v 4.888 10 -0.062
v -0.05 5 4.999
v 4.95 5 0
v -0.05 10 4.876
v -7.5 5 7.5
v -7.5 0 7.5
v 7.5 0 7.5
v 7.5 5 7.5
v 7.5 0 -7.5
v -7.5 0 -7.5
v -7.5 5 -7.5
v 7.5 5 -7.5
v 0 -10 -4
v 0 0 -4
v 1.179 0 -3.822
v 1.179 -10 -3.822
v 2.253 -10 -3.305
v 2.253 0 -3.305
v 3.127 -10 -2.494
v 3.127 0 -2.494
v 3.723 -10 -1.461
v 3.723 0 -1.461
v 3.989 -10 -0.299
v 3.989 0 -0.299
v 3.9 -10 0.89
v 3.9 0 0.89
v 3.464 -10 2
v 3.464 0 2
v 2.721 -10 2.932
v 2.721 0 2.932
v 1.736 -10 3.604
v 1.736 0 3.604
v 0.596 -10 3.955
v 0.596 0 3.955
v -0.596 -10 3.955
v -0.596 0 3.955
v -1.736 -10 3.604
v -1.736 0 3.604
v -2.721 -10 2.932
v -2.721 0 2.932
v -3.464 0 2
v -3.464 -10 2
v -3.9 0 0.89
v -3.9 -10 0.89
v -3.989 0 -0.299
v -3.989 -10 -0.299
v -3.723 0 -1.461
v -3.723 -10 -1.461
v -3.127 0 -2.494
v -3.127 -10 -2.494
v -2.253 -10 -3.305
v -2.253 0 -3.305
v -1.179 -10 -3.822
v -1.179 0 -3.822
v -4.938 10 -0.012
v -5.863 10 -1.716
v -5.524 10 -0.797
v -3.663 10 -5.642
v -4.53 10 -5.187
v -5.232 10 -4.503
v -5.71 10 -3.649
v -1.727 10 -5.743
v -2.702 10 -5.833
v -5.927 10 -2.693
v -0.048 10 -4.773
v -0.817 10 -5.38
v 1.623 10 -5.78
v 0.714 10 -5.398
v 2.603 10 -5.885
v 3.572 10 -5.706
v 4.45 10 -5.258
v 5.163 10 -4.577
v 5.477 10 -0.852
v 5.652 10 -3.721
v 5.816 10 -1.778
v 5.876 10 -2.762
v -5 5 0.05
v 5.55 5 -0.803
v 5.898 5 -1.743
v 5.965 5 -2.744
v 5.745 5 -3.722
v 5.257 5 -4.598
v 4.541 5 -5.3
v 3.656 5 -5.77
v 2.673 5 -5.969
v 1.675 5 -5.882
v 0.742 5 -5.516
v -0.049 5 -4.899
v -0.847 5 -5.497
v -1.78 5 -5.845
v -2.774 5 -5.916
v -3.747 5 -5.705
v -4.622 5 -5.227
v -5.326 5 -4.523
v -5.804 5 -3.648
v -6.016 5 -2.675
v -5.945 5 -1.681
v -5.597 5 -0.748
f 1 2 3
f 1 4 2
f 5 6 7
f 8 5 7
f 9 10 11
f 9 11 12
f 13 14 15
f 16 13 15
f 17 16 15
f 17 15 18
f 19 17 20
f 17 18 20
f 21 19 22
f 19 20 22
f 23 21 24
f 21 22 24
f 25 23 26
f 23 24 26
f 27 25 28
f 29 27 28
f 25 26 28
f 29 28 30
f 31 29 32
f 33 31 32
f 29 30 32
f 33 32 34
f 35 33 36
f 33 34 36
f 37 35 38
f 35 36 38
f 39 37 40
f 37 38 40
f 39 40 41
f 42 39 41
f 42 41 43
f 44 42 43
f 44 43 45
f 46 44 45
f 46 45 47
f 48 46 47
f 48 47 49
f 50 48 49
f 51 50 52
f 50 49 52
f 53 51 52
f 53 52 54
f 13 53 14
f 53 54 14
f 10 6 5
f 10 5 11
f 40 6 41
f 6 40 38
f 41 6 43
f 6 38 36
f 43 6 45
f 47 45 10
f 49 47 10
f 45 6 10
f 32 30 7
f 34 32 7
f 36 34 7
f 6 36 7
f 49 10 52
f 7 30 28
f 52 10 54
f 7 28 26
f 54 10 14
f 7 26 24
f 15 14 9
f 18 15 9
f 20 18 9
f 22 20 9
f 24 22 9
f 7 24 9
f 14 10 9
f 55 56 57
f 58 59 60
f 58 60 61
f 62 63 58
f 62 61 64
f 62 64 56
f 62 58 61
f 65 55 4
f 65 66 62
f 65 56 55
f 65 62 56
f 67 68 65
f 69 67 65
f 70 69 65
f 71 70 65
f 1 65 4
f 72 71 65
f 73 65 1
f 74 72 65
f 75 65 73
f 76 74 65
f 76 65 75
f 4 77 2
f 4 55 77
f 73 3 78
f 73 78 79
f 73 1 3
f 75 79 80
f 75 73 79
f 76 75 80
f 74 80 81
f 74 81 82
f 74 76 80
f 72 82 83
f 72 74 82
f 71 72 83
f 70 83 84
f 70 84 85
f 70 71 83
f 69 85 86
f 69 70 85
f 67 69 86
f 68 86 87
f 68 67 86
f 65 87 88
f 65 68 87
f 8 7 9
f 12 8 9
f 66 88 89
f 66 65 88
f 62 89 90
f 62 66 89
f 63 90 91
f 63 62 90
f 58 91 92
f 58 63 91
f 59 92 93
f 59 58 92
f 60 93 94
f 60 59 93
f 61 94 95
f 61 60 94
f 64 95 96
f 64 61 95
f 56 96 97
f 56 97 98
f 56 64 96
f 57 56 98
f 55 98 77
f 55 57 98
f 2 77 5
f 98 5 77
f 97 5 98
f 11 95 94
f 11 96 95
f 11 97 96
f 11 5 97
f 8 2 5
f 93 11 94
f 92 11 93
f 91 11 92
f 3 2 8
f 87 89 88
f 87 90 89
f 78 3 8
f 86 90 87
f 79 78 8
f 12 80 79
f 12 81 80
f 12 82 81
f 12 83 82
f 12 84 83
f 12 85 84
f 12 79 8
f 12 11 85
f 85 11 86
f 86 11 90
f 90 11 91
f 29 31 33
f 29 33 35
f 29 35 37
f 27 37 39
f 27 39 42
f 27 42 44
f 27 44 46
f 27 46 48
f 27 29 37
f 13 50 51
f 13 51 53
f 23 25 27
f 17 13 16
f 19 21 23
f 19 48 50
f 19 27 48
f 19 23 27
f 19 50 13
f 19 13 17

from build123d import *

# Parameters (mm, degrees)
SKETCH1_W           = 15
SKETCH1_H           = 15
BOSS_EXTRUDE1_DEPTH = 5
BOSS_EXTRUDE2_DEPTH = 5
BOSS_EXTRUDE2_TAPER = 1
SKETCH3_R           = 4
BOSS_EXTRUDE3_DEPTH = 10


with BuildPart() as part:
    # Sketch1 → Boss-Extrude1 (new body)
    with BuildSketch(Plane(origin=(0, 0, 0), x_dir=(1, 0, 0), z_dir=(0, 1, 0))):
        Rectangle(SKETCH1_W, SKETCH1_H)
    extrude(amount=BOSS_EXTRUDE1_DEPTH)

    # Sketch2 → Boss-Extrude2 (add)
    with BuildSketch(Plane(origin=(0, 5, 0), x_dir=(1, 0, 0), z_dir=(0, 1, 0))):
        with BuildLine():
            Line((-4.999500013, -0.049742391), (-0.049747468, -4.999494936))
            Line((-0.049747468, -4.999494936), (4.949747468, 0))
            ThreePointArc((4.949747468, 0), (4.924747439, 4.974497472), (-0.049247481, 4.89949991))
            ThreePointArc((-0.049247481, 4.89949991), (-4.999247442, 4.900257622), (-4.999500013, -0.049742391))
        make_face()
    extrude(amount=BOSS_EXTRUDE2_DEPTH, taper=BOSS_EXTRUDE2_TAPER)

    # Sketch3 → Boss-Extrude3 (add)
    with BuildSketch(Plane.XZ):
        with Locations(Location((0, 0, 0), (0, 0, 270))):
            Circle(SKETCH3_R)
    extrude(amount=BOSS_EXTRUDE3_DEPTH)


solid = part.part
